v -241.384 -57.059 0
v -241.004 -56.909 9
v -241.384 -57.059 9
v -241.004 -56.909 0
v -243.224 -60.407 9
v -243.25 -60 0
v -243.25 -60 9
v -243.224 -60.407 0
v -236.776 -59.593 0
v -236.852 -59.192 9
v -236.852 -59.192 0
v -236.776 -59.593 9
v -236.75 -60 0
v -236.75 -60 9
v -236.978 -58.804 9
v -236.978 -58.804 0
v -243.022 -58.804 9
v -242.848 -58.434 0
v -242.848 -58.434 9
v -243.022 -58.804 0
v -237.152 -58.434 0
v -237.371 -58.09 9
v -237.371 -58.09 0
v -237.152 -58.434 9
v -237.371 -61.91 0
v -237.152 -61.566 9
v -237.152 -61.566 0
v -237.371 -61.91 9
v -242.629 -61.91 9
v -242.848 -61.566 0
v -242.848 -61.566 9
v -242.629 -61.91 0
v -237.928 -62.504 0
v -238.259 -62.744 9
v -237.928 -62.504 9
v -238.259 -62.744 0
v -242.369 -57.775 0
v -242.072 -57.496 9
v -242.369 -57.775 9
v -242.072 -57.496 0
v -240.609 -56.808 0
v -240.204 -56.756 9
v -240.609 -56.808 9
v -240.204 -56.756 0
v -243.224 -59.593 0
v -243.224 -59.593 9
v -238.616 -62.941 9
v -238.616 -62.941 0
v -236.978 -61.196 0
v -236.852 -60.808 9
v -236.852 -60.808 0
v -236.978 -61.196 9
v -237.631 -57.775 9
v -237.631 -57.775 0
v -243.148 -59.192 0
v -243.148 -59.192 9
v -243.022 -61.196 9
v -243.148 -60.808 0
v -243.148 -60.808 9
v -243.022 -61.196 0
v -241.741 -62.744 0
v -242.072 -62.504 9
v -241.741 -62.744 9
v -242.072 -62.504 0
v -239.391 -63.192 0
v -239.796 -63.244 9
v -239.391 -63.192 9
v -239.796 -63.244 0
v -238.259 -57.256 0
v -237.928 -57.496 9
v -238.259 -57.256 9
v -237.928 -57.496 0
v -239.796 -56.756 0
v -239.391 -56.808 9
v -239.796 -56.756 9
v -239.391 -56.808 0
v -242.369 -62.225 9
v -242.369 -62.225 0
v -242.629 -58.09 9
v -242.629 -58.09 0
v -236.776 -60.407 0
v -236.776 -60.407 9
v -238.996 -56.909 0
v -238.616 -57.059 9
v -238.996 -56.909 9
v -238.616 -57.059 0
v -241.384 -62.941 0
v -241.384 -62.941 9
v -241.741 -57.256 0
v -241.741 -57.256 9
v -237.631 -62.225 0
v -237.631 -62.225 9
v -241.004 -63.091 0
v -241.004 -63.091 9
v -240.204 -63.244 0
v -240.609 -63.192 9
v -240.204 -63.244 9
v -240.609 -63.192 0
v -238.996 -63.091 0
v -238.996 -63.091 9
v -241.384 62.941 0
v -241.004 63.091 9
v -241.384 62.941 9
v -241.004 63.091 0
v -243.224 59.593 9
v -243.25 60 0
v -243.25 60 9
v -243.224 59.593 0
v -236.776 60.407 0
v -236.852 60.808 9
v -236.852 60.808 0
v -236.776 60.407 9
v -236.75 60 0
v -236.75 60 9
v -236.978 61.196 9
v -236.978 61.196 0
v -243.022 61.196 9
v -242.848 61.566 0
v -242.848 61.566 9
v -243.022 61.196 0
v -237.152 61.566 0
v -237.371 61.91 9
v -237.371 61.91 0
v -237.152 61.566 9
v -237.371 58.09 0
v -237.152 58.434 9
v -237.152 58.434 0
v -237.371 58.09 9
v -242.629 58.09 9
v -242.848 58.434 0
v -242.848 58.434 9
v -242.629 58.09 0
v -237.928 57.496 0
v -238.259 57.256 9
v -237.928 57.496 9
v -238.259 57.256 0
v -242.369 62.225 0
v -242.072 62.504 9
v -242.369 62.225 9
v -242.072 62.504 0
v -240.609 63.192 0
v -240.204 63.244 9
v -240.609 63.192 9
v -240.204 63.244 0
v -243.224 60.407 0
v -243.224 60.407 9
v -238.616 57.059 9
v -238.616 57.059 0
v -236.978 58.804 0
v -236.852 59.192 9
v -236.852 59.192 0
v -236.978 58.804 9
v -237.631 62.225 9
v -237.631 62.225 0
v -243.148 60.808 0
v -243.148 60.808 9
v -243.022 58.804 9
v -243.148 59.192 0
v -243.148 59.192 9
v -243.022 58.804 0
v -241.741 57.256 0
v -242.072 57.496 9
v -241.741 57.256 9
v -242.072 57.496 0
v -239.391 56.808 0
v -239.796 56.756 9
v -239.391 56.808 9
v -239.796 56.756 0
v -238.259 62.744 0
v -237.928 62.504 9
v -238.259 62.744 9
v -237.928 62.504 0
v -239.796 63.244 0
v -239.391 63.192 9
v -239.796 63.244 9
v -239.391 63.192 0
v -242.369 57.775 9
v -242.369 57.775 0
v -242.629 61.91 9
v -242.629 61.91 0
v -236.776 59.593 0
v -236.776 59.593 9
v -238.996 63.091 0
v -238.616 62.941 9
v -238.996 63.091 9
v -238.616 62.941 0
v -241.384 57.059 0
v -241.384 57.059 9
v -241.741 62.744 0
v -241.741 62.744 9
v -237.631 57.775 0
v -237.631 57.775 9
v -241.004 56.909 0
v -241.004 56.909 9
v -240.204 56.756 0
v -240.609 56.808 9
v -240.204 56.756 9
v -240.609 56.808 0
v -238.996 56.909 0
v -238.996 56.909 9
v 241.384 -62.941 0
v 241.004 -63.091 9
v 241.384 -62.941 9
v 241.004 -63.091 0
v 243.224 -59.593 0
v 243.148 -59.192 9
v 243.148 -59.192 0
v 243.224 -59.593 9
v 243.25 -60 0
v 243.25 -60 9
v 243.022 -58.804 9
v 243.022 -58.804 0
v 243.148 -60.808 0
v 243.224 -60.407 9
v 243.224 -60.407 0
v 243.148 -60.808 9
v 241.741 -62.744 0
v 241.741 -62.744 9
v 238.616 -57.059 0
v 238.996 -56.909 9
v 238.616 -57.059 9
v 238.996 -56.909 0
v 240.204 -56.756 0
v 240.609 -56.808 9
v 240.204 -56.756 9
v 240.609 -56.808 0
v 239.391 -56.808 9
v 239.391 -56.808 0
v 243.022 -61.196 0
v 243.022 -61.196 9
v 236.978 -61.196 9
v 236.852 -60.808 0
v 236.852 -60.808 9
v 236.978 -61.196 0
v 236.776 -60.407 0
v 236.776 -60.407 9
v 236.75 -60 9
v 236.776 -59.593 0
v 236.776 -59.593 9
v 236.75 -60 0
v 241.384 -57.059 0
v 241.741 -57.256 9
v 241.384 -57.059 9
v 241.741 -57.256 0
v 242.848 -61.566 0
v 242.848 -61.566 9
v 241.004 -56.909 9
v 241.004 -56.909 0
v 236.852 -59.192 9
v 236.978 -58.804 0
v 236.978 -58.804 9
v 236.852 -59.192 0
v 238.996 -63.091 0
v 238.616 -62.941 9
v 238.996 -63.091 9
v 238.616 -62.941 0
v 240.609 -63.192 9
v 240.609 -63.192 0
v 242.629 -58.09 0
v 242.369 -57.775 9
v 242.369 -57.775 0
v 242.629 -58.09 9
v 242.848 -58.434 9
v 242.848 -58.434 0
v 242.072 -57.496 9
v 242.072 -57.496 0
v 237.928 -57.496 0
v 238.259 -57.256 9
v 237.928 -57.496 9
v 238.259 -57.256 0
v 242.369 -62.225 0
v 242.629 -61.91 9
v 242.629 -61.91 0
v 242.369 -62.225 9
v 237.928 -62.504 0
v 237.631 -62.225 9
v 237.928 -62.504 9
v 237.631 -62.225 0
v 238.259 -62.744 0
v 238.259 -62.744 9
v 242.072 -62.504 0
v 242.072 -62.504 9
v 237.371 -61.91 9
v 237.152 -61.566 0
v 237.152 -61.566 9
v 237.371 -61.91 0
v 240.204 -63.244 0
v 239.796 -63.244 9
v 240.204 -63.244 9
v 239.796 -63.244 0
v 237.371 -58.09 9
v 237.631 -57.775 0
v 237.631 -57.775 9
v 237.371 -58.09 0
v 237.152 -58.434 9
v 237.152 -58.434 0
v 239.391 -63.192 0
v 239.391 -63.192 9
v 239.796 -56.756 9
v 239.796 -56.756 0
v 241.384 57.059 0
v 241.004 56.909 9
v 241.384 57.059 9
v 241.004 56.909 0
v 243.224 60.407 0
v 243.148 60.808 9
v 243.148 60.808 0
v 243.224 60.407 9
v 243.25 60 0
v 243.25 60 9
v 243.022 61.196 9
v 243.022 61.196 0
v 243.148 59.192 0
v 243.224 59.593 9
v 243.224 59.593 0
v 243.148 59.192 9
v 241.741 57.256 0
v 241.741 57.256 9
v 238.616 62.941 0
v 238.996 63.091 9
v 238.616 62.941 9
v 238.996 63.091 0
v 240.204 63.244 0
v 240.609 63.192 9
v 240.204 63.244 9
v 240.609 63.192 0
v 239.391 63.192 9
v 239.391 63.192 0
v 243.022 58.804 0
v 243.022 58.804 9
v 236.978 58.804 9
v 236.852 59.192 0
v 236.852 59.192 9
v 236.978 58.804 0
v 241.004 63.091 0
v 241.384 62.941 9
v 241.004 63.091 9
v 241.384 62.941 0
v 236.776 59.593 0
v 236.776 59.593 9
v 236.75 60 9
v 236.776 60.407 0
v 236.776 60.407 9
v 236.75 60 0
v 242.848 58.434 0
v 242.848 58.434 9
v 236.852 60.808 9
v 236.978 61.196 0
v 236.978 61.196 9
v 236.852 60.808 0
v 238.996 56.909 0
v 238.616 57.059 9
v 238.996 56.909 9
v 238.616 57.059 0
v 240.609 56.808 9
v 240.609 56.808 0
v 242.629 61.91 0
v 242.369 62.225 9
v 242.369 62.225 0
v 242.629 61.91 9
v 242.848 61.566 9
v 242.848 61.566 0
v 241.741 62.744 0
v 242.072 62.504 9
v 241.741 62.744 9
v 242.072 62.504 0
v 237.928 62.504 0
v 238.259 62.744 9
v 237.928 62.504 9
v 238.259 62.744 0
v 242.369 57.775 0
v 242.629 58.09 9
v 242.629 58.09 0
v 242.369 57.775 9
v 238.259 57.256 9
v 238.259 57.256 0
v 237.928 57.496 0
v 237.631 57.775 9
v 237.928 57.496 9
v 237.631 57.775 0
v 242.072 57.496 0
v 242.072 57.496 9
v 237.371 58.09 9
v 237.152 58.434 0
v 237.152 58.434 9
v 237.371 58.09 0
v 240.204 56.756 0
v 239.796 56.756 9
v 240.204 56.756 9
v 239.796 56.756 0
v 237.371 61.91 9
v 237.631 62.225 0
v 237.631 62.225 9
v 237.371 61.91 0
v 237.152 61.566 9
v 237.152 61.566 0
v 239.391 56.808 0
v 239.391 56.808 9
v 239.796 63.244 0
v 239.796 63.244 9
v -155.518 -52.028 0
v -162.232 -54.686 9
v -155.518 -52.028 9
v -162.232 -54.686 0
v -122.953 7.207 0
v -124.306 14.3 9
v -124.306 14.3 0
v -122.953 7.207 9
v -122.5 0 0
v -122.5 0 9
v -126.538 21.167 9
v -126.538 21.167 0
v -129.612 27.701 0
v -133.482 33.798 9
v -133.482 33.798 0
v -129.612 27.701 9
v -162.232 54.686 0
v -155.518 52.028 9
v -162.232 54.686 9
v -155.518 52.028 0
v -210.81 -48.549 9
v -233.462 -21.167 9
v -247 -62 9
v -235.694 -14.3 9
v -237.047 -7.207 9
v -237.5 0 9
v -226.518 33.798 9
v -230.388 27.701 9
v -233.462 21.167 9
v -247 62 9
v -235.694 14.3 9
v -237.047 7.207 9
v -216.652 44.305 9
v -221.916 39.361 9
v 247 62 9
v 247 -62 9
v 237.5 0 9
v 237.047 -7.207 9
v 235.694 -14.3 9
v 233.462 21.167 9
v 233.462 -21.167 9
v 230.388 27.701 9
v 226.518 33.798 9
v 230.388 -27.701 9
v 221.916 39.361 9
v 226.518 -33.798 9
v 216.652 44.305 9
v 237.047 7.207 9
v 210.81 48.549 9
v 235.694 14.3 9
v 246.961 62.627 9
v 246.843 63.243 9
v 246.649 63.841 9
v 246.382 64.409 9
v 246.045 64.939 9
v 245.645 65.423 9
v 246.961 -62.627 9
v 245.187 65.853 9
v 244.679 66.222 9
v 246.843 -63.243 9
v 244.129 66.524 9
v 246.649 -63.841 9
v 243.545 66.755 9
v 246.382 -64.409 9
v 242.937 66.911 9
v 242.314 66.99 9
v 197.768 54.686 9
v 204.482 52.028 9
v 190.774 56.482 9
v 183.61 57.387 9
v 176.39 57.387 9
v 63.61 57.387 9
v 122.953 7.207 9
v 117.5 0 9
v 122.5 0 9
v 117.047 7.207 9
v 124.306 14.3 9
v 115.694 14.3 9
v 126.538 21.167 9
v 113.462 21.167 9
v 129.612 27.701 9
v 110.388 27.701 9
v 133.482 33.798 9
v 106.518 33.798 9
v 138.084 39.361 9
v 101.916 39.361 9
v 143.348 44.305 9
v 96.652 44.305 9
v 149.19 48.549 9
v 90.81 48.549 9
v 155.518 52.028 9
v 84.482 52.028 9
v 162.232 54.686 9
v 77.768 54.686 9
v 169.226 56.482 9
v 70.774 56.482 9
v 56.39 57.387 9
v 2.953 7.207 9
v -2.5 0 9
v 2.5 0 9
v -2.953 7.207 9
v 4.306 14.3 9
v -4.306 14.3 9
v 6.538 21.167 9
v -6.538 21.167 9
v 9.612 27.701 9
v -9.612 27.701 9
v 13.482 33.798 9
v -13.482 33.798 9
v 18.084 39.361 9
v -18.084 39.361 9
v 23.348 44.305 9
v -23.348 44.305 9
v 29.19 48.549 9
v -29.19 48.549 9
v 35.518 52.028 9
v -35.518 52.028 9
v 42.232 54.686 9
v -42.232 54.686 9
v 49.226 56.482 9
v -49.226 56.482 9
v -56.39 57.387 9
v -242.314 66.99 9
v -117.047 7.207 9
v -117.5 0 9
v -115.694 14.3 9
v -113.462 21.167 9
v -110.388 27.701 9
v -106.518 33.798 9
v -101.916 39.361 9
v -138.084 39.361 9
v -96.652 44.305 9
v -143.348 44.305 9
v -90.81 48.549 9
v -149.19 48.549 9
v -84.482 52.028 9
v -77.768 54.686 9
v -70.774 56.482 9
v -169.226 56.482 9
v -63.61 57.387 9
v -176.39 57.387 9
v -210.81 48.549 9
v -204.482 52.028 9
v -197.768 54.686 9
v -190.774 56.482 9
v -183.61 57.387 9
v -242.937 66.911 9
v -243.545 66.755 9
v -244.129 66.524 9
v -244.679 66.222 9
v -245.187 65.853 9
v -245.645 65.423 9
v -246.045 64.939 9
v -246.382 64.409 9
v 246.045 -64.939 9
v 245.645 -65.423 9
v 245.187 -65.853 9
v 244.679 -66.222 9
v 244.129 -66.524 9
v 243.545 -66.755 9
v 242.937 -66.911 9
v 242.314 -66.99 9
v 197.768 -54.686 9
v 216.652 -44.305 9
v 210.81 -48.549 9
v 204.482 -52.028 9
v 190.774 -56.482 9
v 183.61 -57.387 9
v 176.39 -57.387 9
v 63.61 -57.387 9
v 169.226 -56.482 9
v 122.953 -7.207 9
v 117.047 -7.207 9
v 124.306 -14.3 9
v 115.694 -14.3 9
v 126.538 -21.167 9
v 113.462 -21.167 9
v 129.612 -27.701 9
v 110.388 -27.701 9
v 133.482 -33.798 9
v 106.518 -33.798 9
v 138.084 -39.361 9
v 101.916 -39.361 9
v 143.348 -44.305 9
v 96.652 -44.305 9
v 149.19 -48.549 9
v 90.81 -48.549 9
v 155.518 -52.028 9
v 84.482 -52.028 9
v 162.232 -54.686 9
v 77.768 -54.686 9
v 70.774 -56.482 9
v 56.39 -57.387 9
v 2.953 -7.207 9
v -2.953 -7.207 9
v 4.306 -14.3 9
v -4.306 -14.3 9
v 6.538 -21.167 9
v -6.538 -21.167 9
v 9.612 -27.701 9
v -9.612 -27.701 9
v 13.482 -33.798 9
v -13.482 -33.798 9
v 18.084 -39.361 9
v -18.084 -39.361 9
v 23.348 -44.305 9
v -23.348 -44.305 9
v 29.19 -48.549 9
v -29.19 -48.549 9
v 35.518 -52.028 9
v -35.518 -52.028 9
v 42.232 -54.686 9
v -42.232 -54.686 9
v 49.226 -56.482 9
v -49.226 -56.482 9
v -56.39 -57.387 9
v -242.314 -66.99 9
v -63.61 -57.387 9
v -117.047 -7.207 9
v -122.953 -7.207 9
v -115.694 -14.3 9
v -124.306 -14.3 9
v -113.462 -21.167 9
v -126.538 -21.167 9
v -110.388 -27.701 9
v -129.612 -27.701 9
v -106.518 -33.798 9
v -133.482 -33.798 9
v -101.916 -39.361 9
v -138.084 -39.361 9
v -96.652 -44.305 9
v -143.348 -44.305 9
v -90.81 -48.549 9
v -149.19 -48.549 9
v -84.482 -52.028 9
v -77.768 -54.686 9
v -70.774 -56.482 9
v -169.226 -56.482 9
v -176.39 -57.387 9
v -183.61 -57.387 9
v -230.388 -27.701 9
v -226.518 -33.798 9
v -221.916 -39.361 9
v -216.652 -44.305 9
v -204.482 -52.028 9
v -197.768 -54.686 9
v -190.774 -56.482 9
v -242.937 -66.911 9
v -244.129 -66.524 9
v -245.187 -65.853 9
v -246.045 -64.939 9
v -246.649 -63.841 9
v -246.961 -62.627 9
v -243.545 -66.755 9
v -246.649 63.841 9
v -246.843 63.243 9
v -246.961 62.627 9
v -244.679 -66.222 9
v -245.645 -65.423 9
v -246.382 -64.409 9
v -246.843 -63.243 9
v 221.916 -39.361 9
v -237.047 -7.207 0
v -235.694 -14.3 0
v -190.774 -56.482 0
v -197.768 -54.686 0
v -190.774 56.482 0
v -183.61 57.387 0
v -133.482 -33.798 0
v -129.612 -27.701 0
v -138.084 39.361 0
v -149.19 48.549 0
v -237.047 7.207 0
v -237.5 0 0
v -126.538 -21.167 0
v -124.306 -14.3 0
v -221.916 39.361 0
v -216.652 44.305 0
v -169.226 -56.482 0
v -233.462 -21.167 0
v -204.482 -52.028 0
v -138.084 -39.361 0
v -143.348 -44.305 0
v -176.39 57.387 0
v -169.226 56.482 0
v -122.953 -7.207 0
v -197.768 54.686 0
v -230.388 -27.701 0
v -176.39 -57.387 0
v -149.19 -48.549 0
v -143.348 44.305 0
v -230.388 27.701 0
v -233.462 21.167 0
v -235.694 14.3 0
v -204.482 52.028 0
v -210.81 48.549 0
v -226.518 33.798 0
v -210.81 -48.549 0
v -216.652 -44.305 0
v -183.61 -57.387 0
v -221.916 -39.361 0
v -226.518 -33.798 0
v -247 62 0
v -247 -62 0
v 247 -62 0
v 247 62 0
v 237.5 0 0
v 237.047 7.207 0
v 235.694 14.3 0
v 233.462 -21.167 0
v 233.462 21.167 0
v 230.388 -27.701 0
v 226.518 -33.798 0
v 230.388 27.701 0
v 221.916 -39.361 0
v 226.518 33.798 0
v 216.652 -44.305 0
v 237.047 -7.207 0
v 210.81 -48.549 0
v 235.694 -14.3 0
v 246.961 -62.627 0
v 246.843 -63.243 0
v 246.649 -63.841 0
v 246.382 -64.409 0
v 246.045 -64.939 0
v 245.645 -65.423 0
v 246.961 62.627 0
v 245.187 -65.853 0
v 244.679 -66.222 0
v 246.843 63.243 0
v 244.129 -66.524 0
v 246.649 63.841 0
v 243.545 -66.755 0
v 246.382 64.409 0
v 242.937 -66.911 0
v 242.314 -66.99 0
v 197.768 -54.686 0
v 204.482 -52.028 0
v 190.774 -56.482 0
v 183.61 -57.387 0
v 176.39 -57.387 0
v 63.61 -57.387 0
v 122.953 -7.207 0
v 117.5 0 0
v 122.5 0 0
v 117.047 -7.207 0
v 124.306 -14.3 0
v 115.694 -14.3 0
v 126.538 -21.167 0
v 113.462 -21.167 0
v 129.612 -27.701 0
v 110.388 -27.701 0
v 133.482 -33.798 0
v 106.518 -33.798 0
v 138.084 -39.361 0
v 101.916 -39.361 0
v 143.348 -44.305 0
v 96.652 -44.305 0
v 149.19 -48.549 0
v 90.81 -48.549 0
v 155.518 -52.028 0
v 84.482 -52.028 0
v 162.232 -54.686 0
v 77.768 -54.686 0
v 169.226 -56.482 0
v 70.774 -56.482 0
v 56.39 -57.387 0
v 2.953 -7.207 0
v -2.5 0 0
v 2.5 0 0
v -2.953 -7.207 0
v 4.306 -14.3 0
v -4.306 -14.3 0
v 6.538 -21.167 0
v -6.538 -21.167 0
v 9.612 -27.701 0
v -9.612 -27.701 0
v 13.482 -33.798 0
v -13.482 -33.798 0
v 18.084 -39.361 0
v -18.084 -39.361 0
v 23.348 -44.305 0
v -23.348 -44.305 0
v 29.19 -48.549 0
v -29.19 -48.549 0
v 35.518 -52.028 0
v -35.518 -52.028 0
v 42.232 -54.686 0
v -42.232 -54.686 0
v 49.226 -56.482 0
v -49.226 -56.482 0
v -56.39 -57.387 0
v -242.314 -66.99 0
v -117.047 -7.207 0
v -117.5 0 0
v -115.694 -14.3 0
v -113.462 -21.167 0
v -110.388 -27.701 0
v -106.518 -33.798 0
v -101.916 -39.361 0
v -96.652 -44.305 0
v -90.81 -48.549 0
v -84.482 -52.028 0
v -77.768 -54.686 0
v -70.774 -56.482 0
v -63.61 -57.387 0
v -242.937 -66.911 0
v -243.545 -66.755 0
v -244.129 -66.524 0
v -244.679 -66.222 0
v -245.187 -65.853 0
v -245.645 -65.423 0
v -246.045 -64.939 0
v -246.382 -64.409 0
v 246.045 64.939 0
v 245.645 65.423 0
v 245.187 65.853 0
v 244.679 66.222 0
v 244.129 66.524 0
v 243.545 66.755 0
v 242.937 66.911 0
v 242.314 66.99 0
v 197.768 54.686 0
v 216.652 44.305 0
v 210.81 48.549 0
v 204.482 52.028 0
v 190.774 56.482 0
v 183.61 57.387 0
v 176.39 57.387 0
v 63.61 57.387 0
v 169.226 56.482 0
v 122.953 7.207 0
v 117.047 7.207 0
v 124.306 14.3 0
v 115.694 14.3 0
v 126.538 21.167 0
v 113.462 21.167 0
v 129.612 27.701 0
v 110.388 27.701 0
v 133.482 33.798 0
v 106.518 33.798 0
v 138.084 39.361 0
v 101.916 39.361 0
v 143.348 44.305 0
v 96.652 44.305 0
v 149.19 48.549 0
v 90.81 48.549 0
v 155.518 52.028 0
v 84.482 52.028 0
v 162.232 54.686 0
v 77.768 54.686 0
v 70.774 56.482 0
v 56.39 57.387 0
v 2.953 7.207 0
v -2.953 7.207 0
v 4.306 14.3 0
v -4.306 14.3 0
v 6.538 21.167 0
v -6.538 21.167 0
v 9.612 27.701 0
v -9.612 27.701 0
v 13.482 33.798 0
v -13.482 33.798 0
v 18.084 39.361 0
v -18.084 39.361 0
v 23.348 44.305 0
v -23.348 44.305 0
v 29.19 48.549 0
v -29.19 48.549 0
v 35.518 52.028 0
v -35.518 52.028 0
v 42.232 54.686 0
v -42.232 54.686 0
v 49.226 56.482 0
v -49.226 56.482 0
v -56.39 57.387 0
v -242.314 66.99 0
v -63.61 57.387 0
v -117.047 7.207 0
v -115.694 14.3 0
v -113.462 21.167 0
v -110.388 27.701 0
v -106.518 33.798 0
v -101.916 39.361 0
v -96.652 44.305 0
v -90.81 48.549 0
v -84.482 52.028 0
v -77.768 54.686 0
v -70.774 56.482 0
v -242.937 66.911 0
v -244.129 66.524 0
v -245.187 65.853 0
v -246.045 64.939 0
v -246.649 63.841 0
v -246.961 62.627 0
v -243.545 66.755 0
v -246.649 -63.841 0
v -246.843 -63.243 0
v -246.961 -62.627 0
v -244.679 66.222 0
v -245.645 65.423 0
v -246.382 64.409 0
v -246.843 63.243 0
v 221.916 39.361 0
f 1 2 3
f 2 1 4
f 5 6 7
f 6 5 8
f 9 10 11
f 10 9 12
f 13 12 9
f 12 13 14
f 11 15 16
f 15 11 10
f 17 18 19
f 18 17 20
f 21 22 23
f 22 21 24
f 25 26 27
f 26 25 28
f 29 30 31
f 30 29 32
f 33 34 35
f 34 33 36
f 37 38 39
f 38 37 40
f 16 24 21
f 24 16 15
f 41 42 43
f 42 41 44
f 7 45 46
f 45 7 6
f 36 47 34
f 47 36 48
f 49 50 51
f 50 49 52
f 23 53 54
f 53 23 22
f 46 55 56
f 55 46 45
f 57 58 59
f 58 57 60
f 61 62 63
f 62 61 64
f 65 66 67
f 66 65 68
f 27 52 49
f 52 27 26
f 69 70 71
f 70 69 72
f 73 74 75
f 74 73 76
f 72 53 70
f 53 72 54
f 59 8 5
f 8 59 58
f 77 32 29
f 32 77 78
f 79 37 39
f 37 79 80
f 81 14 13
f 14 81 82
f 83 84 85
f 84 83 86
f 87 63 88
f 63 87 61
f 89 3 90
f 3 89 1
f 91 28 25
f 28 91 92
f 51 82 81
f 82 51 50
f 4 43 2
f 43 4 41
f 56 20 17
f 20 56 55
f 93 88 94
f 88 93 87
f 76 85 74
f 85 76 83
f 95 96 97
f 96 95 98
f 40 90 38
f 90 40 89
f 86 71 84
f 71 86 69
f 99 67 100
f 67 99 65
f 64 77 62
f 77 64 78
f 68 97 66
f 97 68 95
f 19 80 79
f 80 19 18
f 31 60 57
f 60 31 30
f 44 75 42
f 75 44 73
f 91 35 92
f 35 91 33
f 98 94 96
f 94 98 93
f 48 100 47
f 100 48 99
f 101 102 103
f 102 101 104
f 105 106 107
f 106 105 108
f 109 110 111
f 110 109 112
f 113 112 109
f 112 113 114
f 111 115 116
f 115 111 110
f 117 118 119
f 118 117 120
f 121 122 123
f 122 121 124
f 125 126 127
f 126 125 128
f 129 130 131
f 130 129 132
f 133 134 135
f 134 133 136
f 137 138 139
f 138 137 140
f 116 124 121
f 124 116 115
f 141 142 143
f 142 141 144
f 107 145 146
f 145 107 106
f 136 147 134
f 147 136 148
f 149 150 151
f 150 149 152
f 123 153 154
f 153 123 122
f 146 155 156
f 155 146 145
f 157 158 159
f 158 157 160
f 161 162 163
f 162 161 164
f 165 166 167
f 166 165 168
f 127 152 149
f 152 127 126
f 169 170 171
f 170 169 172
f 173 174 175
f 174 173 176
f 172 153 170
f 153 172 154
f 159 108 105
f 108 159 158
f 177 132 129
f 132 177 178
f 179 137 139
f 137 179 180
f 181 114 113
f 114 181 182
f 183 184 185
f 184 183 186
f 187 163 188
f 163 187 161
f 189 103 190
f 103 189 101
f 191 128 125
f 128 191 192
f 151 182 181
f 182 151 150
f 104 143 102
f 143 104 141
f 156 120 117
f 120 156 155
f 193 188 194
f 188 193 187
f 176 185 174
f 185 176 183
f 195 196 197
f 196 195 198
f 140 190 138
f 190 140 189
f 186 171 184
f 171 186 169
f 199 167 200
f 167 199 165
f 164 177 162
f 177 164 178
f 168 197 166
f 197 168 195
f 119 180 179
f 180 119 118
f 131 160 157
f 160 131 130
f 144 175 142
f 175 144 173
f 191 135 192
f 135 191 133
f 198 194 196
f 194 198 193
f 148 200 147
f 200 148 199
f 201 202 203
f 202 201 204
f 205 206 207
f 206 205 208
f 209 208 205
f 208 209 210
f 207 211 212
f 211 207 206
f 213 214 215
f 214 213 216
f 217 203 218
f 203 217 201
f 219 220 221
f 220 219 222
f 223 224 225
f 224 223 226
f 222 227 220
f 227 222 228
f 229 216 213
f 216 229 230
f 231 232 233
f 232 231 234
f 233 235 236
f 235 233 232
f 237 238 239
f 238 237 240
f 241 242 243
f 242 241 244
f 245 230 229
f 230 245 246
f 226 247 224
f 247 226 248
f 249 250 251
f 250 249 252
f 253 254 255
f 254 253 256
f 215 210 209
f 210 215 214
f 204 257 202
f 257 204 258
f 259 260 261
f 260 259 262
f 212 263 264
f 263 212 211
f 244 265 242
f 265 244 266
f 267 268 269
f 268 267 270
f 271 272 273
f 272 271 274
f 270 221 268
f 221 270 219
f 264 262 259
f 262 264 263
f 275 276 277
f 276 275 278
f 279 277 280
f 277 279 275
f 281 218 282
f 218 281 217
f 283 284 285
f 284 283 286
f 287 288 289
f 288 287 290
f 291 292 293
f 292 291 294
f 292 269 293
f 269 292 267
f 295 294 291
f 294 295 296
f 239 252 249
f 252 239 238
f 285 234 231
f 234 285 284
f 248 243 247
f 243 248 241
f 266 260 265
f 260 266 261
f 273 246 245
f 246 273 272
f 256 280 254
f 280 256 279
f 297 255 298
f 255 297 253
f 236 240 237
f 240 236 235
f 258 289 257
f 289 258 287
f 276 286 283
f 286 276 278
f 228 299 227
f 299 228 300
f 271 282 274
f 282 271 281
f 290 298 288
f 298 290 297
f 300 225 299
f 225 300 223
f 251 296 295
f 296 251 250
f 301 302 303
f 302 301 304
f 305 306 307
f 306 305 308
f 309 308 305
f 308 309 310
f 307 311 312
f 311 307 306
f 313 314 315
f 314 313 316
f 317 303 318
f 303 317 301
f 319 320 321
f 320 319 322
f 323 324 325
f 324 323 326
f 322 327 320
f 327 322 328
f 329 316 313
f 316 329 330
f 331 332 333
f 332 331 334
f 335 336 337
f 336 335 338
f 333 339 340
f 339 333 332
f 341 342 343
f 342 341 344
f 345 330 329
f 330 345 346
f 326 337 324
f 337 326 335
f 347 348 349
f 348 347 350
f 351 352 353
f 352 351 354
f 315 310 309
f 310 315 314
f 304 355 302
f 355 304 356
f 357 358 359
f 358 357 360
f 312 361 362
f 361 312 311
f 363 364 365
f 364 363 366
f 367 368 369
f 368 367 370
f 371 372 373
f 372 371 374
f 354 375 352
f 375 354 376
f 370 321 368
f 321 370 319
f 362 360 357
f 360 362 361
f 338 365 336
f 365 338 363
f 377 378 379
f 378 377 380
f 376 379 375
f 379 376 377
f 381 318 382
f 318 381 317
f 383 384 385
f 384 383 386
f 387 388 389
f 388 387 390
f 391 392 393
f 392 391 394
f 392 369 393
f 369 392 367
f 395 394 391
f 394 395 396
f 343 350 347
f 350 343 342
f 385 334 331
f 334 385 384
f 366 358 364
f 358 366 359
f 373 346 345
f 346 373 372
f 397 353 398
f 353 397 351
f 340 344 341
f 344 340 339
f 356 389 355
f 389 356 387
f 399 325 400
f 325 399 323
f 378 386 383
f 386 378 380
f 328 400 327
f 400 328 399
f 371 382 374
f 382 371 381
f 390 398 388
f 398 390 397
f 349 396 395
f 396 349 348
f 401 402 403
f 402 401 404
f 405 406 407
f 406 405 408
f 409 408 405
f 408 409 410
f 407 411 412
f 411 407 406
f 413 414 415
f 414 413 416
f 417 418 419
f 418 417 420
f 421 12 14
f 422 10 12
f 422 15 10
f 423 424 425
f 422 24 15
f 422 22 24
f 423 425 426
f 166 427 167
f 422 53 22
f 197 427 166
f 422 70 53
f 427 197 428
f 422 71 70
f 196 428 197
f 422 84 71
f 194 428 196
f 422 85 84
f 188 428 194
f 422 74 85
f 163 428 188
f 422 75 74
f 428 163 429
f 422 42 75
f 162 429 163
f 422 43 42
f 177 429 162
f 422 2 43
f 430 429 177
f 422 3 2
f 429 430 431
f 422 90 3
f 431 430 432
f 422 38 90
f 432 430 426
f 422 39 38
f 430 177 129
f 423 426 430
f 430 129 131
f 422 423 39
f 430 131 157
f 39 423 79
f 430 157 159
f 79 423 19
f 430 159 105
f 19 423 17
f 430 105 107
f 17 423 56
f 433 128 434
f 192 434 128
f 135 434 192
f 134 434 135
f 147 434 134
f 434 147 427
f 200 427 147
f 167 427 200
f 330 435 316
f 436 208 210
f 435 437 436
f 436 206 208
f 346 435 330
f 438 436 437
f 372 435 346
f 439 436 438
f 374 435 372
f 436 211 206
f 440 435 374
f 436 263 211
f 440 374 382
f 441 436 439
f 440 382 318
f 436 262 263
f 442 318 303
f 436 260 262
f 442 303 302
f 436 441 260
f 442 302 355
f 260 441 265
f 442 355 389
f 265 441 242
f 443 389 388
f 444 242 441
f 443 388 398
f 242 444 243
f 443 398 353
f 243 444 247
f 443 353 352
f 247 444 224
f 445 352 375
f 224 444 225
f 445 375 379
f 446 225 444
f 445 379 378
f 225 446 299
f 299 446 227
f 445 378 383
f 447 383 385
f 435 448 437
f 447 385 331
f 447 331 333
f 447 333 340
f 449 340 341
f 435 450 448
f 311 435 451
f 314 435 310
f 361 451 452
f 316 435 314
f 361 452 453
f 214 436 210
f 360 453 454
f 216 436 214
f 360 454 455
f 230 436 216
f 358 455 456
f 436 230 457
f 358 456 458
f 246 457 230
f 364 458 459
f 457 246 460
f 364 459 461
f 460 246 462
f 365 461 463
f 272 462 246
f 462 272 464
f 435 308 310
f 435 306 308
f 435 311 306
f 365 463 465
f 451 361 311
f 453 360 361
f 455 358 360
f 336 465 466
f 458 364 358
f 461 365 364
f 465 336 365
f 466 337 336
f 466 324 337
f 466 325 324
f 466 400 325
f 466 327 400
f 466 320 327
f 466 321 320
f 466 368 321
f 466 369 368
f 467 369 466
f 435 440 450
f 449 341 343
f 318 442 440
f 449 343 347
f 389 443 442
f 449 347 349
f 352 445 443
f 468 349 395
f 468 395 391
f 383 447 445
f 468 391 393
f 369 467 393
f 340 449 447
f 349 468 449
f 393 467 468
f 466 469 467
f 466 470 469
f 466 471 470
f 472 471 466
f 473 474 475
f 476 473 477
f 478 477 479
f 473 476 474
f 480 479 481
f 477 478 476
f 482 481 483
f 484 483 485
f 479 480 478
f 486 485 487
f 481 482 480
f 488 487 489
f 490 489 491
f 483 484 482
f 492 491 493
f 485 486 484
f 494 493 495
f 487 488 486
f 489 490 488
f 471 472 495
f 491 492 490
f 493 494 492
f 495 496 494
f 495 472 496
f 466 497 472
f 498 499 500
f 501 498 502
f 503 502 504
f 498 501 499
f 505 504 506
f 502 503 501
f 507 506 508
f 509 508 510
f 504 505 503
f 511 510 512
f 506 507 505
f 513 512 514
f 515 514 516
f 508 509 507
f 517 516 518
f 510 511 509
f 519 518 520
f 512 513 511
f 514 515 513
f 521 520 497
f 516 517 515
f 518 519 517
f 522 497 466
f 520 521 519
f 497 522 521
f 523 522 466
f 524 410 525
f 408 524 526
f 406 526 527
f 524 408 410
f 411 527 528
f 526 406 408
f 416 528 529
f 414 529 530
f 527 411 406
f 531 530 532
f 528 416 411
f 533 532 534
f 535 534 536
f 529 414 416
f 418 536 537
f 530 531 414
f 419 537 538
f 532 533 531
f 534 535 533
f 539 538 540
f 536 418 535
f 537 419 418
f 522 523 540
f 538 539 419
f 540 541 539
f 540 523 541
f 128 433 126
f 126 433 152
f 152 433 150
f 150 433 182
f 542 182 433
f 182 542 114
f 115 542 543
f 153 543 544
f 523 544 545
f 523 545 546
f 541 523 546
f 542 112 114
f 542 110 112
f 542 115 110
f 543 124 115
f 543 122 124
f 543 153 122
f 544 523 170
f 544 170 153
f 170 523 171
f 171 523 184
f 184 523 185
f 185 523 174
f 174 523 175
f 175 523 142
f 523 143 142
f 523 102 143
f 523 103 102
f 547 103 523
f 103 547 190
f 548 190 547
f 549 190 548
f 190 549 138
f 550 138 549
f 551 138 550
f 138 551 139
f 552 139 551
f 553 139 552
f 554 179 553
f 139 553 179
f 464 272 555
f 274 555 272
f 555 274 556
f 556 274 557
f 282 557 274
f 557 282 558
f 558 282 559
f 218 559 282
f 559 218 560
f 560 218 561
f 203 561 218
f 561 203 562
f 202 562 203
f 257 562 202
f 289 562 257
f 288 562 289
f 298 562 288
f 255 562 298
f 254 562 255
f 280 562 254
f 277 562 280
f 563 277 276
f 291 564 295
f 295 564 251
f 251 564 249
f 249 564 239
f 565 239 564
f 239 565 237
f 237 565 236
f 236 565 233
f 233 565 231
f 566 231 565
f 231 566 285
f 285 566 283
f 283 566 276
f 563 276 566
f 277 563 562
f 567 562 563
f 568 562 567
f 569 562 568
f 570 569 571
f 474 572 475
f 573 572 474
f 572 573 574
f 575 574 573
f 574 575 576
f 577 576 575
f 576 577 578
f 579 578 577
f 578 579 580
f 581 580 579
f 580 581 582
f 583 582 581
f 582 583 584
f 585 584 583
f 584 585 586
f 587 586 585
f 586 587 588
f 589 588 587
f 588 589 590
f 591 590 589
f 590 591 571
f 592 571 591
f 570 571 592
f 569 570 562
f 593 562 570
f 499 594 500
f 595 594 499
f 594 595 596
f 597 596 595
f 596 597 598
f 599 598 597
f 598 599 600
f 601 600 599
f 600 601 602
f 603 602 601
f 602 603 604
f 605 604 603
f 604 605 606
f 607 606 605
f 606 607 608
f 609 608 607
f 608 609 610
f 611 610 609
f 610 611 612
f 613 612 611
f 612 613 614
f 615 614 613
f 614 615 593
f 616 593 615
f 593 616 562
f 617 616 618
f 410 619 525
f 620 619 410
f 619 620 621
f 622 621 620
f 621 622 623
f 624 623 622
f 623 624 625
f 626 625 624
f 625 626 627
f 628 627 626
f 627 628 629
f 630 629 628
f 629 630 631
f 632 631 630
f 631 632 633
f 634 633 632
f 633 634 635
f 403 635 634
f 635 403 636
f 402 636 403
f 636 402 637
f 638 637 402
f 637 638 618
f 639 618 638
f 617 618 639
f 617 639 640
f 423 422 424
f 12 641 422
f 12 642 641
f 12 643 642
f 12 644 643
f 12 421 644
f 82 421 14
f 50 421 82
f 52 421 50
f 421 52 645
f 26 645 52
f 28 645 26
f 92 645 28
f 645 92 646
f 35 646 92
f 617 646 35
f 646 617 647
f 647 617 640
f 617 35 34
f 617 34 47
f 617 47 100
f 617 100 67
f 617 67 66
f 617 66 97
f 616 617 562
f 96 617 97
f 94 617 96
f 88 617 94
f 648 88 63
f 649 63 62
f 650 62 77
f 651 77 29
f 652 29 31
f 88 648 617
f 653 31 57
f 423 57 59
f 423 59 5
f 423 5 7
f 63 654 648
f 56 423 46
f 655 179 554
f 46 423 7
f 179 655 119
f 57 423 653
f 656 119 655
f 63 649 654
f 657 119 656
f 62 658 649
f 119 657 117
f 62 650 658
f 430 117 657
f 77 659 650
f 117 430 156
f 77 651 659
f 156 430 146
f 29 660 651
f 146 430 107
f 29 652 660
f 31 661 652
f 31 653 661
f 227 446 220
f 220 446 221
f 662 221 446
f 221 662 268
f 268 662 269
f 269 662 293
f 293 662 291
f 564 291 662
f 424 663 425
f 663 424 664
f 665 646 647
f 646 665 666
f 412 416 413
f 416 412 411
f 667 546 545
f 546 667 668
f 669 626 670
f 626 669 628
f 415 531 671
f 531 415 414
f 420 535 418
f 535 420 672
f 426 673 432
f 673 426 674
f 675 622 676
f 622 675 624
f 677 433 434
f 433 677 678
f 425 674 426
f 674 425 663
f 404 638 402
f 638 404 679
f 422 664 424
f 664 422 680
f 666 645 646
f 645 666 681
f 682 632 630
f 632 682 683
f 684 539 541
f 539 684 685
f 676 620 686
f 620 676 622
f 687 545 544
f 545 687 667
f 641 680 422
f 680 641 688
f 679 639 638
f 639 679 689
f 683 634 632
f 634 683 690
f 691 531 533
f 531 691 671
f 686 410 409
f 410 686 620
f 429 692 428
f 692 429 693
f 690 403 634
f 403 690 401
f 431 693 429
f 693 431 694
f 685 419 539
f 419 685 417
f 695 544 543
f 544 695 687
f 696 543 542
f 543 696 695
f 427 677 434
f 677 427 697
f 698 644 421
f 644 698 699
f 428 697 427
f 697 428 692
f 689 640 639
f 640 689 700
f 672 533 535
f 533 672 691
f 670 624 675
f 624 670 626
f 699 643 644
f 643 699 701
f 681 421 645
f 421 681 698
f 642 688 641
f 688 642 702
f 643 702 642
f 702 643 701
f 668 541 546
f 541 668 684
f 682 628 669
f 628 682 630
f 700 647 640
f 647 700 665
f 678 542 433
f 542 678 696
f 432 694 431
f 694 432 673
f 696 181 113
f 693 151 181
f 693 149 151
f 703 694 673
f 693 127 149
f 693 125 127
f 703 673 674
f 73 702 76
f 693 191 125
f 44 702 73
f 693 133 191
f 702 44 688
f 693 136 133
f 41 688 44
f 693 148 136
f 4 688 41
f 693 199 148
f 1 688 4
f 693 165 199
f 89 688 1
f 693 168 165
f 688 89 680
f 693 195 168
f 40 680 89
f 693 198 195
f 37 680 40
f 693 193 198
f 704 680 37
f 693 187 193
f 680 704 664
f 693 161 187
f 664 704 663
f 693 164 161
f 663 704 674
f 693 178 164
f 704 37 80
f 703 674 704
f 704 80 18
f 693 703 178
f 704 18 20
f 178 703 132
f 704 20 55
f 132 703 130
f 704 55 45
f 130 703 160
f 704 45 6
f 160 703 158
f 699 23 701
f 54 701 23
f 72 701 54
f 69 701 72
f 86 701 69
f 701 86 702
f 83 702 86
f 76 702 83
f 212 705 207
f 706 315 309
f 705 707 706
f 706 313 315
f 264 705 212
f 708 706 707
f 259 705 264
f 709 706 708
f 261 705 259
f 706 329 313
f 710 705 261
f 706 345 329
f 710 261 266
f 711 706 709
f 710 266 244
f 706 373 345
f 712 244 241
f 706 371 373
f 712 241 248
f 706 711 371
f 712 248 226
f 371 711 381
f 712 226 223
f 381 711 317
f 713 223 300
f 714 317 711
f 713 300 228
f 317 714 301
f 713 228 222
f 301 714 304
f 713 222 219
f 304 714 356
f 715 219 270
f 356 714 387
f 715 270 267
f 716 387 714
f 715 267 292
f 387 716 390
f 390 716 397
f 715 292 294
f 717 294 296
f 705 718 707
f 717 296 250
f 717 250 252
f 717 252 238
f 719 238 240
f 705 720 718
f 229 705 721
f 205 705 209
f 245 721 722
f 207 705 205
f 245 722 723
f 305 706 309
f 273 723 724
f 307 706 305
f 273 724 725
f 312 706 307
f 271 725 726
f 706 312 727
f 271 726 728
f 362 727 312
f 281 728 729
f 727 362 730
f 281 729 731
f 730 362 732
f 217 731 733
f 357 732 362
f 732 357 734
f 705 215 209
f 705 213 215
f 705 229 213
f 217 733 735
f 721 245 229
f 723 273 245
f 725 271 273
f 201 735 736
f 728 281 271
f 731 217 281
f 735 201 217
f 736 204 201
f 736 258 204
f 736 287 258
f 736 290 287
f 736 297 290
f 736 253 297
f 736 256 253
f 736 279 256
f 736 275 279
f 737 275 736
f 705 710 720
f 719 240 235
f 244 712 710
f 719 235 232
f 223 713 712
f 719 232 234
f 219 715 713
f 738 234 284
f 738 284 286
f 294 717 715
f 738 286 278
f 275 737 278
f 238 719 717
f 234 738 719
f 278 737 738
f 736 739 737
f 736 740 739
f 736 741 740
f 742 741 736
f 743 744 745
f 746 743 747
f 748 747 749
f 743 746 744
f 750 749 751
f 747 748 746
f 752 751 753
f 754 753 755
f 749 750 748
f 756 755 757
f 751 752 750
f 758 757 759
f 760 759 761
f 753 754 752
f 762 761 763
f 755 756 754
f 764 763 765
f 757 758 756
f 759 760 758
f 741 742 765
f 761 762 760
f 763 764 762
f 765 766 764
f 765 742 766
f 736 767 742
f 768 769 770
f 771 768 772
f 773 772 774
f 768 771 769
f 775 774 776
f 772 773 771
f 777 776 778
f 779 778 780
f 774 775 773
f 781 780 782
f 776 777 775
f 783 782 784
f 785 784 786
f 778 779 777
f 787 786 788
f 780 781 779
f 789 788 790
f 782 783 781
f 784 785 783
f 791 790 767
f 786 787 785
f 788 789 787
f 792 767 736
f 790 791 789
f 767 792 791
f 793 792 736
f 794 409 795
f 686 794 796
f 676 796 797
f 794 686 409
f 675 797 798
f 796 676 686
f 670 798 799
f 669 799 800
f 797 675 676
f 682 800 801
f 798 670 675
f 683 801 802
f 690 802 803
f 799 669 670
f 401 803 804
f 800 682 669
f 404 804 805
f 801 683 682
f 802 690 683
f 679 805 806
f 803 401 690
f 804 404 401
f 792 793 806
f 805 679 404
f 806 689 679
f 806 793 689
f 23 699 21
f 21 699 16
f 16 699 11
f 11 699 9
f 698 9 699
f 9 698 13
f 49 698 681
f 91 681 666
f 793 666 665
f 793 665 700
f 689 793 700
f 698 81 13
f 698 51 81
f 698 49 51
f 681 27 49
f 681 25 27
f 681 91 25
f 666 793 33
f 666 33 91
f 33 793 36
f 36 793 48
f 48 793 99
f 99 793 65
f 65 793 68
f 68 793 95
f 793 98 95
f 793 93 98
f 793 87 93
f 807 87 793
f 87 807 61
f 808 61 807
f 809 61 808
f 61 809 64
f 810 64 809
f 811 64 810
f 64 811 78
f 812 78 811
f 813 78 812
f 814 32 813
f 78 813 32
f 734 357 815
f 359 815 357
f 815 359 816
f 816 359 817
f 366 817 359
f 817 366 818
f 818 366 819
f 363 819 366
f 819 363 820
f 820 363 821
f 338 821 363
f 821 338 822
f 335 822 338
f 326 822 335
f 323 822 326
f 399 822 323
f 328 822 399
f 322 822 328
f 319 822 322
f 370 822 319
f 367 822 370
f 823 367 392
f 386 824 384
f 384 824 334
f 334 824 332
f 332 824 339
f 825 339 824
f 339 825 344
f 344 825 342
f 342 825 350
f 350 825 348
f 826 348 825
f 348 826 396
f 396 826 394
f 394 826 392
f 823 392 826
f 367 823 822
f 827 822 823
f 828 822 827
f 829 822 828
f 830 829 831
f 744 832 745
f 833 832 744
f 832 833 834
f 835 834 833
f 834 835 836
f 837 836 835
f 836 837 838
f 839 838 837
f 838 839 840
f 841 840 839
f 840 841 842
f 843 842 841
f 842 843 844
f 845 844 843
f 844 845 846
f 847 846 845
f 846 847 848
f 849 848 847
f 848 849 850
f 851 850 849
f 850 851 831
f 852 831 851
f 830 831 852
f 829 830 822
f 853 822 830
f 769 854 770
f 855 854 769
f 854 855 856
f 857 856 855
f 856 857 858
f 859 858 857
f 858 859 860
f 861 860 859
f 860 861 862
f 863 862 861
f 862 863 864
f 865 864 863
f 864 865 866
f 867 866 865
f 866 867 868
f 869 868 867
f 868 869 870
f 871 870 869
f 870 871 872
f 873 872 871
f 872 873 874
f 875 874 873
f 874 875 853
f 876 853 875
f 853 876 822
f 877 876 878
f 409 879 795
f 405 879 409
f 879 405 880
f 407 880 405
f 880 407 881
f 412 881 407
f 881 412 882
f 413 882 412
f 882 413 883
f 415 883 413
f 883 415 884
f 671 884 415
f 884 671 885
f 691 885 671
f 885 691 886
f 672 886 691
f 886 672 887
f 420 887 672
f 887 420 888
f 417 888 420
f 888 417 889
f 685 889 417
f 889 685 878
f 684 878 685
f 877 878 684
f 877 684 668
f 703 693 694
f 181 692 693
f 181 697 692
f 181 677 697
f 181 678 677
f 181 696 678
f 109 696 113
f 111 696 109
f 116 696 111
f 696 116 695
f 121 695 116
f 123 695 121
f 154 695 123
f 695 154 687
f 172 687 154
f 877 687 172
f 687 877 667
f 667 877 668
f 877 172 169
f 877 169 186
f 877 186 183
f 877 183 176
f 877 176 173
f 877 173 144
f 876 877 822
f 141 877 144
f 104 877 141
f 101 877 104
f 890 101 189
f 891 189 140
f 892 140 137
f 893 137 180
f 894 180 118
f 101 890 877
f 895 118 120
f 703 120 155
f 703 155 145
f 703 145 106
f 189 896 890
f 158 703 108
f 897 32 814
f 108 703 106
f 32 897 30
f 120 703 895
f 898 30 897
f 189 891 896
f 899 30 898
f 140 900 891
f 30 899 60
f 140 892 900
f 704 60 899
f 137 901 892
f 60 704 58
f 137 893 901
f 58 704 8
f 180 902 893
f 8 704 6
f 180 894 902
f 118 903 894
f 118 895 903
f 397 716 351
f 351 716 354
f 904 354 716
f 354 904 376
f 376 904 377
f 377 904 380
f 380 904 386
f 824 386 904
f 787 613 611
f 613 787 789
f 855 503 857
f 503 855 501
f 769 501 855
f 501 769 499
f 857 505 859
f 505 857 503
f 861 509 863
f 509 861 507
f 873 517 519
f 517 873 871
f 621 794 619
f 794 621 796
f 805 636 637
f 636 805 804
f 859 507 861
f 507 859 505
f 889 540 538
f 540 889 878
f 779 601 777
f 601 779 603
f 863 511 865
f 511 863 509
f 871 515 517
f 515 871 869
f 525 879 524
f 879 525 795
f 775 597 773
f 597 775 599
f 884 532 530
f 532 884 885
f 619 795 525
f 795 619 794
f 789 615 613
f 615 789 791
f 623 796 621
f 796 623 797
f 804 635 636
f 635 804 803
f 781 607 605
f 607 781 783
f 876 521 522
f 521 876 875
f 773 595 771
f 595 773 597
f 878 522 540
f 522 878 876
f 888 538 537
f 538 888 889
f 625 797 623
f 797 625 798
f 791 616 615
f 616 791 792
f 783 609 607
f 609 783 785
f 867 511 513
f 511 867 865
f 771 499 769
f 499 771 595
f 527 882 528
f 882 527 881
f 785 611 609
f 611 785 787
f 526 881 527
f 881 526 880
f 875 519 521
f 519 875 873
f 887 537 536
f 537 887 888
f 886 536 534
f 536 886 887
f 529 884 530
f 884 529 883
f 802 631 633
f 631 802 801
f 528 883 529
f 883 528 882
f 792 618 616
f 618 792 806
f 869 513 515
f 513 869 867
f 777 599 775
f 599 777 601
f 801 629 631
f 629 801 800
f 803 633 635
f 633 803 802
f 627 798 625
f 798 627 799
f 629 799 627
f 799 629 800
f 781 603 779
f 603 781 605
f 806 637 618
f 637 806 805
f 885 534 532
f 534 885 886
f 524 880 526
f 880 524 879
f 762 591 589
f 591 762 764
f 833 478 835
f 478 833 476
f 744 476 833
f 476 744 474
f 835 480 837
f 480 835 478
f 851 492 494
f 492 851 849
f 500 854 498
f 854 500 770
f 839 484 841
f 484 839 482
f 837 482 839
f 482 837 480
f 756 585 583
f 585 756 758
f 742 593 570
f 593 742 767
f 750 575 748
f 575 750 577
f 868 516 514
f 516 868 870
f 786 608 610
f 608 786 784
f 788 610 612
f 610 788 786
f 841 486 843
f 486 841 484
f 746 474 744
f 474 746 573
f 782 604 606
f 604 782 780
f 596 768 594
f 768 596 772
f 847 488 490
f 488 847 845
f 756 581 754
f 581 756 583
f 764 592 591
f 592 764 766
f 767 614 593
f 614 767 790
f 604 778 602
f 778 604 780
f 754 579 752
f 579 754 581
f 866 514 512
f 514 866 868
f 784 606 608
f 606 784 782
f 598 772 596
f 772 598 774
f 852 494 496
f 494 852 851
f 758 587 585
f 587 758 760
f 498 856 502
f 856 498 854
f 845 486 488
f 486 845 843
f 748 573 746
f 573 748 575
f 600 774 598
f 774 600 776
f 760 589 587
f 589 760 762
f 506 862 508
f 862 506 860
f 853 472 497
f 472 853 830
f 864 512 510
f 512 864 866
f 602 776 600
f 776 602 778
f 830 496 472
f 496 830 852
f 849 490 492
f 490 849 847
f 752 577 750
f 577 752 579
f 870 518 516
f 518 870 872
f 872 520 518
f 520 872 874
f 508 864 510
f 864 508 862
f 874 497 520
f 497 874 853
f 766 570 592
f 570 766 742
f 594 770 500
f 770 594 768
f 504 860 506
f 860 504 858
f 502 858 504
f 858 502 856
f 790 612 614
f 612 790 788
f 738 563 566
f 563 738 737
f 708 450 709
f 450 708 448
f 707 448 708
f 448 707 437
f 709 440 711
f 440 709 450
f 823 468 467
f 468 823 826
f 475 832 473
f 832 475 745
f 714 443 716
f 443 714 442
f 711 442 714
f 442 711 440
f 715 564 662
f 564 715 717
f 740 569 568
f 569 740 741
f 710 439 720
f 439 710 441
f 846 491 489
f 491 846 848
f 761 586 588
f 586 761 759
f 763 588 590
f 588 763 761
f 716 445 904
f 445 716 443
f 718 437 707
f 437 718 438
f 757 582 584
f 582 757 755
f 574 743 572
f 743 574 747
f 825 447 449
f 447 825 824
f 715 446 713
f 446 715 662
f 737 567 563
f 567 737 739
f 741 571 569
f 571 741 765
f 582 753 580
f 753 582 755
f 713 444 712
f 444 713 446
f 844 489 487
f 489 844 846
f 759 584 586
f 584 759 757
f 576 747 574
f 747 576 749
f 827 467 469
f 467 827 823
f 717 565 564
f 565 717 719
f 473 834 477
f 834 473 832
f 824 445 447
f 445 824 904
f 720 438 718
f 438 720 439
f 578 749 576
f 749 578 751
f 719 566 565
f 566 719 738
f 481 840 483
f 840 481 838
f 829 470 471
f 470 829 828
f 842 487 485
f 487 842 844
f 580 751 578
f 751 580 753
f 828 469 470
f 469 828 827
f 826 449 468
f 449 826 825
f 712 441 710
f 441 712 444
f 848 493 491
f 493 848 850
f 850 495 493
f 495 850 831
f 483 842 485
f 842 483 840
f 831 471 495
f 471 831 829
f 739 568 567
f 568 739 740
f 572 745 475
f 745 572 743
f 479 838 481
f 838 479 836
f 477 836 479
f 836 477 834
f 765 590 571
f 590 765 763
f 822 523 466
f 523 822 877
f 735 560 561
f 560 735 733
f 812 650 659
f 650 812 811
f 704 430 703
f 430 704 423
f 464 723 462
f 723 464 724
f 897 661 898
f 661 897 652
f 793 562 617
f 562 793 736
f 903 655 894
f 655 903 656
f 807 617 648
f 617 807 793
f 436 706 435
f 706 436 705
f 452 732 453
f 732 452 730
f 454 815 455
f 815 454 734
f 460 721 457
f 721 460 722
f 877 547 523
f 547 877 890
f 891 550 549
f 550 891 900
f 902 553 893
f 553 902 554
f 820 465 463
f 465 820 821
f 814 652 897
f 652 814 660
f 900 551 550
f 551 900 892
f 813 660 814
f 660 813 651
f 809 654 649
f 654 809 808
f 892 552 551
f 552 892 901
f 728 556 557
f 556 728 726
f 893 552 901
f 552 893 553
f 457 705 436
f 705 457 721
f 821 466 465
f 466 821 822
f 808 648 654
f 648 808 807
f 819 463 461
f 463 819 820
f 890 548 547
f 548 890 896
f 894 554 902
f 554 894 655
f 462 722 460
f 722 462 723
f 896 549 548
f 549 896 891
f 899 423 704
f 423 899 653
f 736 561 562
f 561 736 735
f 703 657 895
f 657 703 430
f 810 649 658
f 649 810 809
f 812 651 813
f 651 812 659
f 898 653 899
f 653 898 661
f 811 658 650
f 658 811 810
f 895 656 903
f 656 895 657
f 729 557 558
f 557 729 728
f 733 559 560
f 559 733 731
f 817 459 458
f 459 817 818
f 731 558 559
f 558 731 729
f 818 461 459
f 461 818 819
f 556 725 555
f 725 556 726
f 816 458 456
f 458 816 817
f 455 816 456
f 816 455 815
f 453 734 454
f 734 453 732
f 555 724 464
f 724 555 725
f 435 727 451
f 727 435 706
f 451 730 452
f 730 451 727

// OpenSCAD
$fn = 50;


difference() {
	union() {
		hull() {
			translate(v = [-242.0000000000, 62.0000000000, 0]) {
				cylinder(h = 9, r = 5);
			}
			translate(v = [242.0000000000, 62.0000000000, 0]) {
				cylinder(h = 9, r = 5);
			}
			translate(v = [-242.0000000000, -62.0000000000, 0]) {
				cylinder(h = 9, r = 5);
			}
			translate(v = [242.0000000000, -62.0000000000, 0]) {
				cylinder(h = 9, r = 5);
			}
		}
	}
	union() {
		#translate(v = [-240.0000000000, -60.0000000000, -100.0000000000]) {
			cylinder(h = 200, r = 3.2500000000);
		}
		#translate(v = [-240.0000000000, 60.0000000000, -100.0000000000]) {
			cylinder(h = 200, r = 3.2500000000);
		}
		#translate(v = [240.0000000000, -60.0000000000, -100.0000000000]) {
			cylinder(h = 200, r = 3.2500000000);
		}
		#translate(v = [240.0000000000, 60.0000000000, -100.0000000000]) {
			cylinder(h = 200, r = 3.2500000000);
		}
		#translate(v = [-180.0000000000, 0, 0]) {
			cylinder(h = 9, r = 57.5000000000);
		}
		#translate(v = [-60.0000000000, 0, 0]) {
			cylinder(h = 9, r = 57.5000000000);
		}
		#translate(v = [60.0000000000, 0, 0]) {
			cylinder(h = 9, r = 57.5000000000);
		}
		#translate(v = [180.0000000000, 0, 0]) {
			cylinder(h = 9, r = 57.5000000000);
		}
	}
}
